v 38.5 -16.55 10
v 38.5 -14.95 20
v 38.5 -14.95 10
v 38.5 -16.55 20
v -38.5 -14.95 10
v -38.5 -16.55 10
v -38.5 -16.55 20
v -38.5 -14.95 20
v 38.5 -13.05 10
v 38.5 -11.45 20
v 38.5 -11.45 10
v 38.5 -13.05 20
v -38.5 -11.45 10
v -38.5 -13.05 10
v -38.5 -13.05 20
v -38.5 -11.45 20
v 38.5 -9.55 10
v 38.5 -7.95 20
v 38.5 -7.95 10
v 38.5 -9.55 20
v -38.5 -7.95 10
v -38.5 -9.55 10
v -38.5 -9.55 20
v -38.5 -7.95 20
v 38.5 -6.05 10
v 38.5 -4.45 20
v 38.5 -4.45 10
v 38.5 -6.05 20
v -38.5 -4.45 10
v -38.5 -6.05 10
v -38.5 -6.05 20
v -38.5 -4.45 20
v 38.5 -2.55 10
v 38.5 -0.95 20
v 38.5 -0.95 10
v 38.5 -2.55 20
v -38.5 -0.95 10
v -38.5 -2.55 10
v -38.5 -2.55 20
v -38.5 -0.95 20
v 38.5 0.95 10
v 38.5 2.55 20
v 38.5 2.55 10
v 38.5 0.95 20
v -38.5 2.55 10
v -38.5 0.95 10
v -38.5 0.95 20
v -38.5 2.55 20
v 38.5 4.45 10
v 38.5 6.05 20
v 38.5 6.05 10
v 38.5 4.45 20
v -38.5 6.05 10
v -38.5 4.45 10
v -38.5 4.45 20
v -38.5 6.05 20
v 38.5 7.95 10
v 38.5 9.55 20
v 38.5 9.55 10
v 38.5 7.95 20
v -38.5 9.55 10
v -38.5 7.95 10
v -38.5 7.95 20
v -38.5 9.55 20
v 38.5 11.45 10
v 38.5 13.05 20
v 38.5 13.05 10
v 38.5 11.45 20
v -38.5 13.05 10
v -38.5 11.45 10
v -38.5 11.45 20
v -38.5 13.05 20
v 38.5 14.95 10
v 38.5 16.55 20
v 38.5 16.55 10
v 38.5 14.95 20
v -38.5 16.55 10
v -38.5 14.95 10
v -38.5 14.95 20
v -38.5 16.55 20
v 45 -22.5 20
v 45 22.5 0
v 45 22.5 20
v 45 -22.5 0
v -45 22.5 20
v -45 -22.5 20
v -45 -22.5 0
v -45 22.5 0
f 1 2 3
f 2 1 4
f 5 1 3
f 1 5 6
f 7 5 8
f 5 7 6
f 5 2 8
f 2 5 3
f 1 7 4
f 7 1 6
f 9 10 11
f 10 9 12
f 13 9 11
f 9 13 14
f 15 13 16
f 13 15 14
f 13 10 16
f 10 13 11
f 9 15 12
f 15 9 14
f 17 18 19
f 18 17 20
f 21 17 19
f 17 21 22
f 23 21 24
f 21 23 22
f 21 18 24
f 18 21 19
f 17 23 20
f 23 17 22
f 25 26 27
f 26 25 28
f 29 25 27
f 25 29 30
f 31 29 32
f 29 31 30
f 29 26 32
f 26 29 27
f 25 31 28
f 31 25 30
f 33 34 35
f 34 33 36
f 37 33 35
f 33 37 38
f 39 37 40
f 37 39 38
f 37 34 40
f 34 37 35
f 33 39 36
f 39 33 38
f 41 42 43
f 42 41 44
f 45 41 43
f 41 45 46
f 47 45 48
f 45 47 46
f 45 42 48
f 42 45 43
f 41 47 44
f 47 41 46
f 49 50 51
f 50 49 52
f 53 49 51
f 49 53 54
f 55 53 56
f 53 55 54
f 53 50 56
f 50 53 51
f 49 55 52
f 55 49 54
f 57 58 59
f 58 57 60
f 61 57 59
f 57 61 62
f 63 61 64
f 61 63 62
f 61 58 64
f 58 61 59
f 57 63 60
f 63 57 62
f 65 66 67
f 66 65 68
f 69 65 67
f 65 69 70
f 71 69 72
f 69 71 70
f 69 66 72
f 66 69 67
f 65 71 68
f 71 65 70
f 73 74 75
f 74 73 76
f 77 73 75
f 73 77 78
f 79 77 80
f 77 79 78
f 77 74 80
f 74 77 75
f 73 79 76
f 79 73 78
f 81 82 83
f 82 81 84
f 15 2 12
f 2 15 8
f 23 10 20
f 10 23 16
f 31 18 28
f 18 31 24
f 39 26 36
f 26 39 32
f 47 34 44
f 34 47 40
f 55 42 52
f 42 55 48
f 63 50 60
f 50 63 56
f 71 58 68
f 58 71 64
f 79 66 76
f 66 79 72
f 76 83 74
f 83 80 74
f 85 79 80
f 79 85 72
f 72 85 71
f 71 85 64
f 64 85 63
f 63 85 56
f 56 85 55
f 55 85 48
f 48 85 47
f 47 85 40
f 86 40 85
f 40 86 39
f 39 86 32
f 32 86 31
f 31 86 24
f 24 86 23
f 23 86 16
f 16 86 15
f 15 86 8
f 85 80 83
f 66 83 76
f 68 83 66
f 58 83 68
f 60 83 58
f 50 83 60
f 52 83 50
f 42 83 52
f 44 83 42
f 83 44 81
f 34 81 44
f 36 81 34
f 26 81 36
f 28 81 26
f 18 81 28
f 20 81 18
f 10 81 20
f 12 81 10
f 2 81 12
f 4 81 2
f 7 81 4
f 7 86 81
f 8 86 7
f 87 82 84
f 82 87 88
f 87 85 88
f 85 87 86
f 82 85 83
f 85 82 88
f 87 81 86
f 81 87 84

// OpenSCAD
// Slide drying rack - holds 10 microscope slides upright on their long edge
// Print orientation: base block on the XY plane, slots open upward (+Z)

// ---------------- Parameters ----------------
block_len    = 90;    // base block length along X (mm)
block_wid    = 45;    // base block width along Y (mm)
block_ht     = 20;    // base block height along Z (mm)

slot_count   = 10;    // number of slide slots
slot_len     = 77;    // slot length along X (mm)
slot_wid     = 1.6;   // slot width along Y (mm)
slot_depth   = 10;    // slot depth from top face (mm)
slot_pitch   = 3.5;   // centre-to-centre spacing of slots along Y (mm)

eps          = 0.5;   // overshoot so cutters pass cleanly through the top face

$fn = 64;

// ---------------- Model ----------------
difference() {
    // Solid base block, centred in X and Y, resting on z = 0
    translate([-block_len/2, -block_wid/2, 0])
        cube([block_len, block_wid, block_ht]);

    // Row of parallel slots, centred on the block in X and Y
    for (i = [0 : slot_count - 1]) {
        y_c = (i - (slot_count - 1)/2) * slot_pitch;
        translate([-slot_len/2, y_c - slot_wid/2, block_ht - slot_depth])
            cube([slot_len, slot_wid, slot_depth + eps]);
    }
}
